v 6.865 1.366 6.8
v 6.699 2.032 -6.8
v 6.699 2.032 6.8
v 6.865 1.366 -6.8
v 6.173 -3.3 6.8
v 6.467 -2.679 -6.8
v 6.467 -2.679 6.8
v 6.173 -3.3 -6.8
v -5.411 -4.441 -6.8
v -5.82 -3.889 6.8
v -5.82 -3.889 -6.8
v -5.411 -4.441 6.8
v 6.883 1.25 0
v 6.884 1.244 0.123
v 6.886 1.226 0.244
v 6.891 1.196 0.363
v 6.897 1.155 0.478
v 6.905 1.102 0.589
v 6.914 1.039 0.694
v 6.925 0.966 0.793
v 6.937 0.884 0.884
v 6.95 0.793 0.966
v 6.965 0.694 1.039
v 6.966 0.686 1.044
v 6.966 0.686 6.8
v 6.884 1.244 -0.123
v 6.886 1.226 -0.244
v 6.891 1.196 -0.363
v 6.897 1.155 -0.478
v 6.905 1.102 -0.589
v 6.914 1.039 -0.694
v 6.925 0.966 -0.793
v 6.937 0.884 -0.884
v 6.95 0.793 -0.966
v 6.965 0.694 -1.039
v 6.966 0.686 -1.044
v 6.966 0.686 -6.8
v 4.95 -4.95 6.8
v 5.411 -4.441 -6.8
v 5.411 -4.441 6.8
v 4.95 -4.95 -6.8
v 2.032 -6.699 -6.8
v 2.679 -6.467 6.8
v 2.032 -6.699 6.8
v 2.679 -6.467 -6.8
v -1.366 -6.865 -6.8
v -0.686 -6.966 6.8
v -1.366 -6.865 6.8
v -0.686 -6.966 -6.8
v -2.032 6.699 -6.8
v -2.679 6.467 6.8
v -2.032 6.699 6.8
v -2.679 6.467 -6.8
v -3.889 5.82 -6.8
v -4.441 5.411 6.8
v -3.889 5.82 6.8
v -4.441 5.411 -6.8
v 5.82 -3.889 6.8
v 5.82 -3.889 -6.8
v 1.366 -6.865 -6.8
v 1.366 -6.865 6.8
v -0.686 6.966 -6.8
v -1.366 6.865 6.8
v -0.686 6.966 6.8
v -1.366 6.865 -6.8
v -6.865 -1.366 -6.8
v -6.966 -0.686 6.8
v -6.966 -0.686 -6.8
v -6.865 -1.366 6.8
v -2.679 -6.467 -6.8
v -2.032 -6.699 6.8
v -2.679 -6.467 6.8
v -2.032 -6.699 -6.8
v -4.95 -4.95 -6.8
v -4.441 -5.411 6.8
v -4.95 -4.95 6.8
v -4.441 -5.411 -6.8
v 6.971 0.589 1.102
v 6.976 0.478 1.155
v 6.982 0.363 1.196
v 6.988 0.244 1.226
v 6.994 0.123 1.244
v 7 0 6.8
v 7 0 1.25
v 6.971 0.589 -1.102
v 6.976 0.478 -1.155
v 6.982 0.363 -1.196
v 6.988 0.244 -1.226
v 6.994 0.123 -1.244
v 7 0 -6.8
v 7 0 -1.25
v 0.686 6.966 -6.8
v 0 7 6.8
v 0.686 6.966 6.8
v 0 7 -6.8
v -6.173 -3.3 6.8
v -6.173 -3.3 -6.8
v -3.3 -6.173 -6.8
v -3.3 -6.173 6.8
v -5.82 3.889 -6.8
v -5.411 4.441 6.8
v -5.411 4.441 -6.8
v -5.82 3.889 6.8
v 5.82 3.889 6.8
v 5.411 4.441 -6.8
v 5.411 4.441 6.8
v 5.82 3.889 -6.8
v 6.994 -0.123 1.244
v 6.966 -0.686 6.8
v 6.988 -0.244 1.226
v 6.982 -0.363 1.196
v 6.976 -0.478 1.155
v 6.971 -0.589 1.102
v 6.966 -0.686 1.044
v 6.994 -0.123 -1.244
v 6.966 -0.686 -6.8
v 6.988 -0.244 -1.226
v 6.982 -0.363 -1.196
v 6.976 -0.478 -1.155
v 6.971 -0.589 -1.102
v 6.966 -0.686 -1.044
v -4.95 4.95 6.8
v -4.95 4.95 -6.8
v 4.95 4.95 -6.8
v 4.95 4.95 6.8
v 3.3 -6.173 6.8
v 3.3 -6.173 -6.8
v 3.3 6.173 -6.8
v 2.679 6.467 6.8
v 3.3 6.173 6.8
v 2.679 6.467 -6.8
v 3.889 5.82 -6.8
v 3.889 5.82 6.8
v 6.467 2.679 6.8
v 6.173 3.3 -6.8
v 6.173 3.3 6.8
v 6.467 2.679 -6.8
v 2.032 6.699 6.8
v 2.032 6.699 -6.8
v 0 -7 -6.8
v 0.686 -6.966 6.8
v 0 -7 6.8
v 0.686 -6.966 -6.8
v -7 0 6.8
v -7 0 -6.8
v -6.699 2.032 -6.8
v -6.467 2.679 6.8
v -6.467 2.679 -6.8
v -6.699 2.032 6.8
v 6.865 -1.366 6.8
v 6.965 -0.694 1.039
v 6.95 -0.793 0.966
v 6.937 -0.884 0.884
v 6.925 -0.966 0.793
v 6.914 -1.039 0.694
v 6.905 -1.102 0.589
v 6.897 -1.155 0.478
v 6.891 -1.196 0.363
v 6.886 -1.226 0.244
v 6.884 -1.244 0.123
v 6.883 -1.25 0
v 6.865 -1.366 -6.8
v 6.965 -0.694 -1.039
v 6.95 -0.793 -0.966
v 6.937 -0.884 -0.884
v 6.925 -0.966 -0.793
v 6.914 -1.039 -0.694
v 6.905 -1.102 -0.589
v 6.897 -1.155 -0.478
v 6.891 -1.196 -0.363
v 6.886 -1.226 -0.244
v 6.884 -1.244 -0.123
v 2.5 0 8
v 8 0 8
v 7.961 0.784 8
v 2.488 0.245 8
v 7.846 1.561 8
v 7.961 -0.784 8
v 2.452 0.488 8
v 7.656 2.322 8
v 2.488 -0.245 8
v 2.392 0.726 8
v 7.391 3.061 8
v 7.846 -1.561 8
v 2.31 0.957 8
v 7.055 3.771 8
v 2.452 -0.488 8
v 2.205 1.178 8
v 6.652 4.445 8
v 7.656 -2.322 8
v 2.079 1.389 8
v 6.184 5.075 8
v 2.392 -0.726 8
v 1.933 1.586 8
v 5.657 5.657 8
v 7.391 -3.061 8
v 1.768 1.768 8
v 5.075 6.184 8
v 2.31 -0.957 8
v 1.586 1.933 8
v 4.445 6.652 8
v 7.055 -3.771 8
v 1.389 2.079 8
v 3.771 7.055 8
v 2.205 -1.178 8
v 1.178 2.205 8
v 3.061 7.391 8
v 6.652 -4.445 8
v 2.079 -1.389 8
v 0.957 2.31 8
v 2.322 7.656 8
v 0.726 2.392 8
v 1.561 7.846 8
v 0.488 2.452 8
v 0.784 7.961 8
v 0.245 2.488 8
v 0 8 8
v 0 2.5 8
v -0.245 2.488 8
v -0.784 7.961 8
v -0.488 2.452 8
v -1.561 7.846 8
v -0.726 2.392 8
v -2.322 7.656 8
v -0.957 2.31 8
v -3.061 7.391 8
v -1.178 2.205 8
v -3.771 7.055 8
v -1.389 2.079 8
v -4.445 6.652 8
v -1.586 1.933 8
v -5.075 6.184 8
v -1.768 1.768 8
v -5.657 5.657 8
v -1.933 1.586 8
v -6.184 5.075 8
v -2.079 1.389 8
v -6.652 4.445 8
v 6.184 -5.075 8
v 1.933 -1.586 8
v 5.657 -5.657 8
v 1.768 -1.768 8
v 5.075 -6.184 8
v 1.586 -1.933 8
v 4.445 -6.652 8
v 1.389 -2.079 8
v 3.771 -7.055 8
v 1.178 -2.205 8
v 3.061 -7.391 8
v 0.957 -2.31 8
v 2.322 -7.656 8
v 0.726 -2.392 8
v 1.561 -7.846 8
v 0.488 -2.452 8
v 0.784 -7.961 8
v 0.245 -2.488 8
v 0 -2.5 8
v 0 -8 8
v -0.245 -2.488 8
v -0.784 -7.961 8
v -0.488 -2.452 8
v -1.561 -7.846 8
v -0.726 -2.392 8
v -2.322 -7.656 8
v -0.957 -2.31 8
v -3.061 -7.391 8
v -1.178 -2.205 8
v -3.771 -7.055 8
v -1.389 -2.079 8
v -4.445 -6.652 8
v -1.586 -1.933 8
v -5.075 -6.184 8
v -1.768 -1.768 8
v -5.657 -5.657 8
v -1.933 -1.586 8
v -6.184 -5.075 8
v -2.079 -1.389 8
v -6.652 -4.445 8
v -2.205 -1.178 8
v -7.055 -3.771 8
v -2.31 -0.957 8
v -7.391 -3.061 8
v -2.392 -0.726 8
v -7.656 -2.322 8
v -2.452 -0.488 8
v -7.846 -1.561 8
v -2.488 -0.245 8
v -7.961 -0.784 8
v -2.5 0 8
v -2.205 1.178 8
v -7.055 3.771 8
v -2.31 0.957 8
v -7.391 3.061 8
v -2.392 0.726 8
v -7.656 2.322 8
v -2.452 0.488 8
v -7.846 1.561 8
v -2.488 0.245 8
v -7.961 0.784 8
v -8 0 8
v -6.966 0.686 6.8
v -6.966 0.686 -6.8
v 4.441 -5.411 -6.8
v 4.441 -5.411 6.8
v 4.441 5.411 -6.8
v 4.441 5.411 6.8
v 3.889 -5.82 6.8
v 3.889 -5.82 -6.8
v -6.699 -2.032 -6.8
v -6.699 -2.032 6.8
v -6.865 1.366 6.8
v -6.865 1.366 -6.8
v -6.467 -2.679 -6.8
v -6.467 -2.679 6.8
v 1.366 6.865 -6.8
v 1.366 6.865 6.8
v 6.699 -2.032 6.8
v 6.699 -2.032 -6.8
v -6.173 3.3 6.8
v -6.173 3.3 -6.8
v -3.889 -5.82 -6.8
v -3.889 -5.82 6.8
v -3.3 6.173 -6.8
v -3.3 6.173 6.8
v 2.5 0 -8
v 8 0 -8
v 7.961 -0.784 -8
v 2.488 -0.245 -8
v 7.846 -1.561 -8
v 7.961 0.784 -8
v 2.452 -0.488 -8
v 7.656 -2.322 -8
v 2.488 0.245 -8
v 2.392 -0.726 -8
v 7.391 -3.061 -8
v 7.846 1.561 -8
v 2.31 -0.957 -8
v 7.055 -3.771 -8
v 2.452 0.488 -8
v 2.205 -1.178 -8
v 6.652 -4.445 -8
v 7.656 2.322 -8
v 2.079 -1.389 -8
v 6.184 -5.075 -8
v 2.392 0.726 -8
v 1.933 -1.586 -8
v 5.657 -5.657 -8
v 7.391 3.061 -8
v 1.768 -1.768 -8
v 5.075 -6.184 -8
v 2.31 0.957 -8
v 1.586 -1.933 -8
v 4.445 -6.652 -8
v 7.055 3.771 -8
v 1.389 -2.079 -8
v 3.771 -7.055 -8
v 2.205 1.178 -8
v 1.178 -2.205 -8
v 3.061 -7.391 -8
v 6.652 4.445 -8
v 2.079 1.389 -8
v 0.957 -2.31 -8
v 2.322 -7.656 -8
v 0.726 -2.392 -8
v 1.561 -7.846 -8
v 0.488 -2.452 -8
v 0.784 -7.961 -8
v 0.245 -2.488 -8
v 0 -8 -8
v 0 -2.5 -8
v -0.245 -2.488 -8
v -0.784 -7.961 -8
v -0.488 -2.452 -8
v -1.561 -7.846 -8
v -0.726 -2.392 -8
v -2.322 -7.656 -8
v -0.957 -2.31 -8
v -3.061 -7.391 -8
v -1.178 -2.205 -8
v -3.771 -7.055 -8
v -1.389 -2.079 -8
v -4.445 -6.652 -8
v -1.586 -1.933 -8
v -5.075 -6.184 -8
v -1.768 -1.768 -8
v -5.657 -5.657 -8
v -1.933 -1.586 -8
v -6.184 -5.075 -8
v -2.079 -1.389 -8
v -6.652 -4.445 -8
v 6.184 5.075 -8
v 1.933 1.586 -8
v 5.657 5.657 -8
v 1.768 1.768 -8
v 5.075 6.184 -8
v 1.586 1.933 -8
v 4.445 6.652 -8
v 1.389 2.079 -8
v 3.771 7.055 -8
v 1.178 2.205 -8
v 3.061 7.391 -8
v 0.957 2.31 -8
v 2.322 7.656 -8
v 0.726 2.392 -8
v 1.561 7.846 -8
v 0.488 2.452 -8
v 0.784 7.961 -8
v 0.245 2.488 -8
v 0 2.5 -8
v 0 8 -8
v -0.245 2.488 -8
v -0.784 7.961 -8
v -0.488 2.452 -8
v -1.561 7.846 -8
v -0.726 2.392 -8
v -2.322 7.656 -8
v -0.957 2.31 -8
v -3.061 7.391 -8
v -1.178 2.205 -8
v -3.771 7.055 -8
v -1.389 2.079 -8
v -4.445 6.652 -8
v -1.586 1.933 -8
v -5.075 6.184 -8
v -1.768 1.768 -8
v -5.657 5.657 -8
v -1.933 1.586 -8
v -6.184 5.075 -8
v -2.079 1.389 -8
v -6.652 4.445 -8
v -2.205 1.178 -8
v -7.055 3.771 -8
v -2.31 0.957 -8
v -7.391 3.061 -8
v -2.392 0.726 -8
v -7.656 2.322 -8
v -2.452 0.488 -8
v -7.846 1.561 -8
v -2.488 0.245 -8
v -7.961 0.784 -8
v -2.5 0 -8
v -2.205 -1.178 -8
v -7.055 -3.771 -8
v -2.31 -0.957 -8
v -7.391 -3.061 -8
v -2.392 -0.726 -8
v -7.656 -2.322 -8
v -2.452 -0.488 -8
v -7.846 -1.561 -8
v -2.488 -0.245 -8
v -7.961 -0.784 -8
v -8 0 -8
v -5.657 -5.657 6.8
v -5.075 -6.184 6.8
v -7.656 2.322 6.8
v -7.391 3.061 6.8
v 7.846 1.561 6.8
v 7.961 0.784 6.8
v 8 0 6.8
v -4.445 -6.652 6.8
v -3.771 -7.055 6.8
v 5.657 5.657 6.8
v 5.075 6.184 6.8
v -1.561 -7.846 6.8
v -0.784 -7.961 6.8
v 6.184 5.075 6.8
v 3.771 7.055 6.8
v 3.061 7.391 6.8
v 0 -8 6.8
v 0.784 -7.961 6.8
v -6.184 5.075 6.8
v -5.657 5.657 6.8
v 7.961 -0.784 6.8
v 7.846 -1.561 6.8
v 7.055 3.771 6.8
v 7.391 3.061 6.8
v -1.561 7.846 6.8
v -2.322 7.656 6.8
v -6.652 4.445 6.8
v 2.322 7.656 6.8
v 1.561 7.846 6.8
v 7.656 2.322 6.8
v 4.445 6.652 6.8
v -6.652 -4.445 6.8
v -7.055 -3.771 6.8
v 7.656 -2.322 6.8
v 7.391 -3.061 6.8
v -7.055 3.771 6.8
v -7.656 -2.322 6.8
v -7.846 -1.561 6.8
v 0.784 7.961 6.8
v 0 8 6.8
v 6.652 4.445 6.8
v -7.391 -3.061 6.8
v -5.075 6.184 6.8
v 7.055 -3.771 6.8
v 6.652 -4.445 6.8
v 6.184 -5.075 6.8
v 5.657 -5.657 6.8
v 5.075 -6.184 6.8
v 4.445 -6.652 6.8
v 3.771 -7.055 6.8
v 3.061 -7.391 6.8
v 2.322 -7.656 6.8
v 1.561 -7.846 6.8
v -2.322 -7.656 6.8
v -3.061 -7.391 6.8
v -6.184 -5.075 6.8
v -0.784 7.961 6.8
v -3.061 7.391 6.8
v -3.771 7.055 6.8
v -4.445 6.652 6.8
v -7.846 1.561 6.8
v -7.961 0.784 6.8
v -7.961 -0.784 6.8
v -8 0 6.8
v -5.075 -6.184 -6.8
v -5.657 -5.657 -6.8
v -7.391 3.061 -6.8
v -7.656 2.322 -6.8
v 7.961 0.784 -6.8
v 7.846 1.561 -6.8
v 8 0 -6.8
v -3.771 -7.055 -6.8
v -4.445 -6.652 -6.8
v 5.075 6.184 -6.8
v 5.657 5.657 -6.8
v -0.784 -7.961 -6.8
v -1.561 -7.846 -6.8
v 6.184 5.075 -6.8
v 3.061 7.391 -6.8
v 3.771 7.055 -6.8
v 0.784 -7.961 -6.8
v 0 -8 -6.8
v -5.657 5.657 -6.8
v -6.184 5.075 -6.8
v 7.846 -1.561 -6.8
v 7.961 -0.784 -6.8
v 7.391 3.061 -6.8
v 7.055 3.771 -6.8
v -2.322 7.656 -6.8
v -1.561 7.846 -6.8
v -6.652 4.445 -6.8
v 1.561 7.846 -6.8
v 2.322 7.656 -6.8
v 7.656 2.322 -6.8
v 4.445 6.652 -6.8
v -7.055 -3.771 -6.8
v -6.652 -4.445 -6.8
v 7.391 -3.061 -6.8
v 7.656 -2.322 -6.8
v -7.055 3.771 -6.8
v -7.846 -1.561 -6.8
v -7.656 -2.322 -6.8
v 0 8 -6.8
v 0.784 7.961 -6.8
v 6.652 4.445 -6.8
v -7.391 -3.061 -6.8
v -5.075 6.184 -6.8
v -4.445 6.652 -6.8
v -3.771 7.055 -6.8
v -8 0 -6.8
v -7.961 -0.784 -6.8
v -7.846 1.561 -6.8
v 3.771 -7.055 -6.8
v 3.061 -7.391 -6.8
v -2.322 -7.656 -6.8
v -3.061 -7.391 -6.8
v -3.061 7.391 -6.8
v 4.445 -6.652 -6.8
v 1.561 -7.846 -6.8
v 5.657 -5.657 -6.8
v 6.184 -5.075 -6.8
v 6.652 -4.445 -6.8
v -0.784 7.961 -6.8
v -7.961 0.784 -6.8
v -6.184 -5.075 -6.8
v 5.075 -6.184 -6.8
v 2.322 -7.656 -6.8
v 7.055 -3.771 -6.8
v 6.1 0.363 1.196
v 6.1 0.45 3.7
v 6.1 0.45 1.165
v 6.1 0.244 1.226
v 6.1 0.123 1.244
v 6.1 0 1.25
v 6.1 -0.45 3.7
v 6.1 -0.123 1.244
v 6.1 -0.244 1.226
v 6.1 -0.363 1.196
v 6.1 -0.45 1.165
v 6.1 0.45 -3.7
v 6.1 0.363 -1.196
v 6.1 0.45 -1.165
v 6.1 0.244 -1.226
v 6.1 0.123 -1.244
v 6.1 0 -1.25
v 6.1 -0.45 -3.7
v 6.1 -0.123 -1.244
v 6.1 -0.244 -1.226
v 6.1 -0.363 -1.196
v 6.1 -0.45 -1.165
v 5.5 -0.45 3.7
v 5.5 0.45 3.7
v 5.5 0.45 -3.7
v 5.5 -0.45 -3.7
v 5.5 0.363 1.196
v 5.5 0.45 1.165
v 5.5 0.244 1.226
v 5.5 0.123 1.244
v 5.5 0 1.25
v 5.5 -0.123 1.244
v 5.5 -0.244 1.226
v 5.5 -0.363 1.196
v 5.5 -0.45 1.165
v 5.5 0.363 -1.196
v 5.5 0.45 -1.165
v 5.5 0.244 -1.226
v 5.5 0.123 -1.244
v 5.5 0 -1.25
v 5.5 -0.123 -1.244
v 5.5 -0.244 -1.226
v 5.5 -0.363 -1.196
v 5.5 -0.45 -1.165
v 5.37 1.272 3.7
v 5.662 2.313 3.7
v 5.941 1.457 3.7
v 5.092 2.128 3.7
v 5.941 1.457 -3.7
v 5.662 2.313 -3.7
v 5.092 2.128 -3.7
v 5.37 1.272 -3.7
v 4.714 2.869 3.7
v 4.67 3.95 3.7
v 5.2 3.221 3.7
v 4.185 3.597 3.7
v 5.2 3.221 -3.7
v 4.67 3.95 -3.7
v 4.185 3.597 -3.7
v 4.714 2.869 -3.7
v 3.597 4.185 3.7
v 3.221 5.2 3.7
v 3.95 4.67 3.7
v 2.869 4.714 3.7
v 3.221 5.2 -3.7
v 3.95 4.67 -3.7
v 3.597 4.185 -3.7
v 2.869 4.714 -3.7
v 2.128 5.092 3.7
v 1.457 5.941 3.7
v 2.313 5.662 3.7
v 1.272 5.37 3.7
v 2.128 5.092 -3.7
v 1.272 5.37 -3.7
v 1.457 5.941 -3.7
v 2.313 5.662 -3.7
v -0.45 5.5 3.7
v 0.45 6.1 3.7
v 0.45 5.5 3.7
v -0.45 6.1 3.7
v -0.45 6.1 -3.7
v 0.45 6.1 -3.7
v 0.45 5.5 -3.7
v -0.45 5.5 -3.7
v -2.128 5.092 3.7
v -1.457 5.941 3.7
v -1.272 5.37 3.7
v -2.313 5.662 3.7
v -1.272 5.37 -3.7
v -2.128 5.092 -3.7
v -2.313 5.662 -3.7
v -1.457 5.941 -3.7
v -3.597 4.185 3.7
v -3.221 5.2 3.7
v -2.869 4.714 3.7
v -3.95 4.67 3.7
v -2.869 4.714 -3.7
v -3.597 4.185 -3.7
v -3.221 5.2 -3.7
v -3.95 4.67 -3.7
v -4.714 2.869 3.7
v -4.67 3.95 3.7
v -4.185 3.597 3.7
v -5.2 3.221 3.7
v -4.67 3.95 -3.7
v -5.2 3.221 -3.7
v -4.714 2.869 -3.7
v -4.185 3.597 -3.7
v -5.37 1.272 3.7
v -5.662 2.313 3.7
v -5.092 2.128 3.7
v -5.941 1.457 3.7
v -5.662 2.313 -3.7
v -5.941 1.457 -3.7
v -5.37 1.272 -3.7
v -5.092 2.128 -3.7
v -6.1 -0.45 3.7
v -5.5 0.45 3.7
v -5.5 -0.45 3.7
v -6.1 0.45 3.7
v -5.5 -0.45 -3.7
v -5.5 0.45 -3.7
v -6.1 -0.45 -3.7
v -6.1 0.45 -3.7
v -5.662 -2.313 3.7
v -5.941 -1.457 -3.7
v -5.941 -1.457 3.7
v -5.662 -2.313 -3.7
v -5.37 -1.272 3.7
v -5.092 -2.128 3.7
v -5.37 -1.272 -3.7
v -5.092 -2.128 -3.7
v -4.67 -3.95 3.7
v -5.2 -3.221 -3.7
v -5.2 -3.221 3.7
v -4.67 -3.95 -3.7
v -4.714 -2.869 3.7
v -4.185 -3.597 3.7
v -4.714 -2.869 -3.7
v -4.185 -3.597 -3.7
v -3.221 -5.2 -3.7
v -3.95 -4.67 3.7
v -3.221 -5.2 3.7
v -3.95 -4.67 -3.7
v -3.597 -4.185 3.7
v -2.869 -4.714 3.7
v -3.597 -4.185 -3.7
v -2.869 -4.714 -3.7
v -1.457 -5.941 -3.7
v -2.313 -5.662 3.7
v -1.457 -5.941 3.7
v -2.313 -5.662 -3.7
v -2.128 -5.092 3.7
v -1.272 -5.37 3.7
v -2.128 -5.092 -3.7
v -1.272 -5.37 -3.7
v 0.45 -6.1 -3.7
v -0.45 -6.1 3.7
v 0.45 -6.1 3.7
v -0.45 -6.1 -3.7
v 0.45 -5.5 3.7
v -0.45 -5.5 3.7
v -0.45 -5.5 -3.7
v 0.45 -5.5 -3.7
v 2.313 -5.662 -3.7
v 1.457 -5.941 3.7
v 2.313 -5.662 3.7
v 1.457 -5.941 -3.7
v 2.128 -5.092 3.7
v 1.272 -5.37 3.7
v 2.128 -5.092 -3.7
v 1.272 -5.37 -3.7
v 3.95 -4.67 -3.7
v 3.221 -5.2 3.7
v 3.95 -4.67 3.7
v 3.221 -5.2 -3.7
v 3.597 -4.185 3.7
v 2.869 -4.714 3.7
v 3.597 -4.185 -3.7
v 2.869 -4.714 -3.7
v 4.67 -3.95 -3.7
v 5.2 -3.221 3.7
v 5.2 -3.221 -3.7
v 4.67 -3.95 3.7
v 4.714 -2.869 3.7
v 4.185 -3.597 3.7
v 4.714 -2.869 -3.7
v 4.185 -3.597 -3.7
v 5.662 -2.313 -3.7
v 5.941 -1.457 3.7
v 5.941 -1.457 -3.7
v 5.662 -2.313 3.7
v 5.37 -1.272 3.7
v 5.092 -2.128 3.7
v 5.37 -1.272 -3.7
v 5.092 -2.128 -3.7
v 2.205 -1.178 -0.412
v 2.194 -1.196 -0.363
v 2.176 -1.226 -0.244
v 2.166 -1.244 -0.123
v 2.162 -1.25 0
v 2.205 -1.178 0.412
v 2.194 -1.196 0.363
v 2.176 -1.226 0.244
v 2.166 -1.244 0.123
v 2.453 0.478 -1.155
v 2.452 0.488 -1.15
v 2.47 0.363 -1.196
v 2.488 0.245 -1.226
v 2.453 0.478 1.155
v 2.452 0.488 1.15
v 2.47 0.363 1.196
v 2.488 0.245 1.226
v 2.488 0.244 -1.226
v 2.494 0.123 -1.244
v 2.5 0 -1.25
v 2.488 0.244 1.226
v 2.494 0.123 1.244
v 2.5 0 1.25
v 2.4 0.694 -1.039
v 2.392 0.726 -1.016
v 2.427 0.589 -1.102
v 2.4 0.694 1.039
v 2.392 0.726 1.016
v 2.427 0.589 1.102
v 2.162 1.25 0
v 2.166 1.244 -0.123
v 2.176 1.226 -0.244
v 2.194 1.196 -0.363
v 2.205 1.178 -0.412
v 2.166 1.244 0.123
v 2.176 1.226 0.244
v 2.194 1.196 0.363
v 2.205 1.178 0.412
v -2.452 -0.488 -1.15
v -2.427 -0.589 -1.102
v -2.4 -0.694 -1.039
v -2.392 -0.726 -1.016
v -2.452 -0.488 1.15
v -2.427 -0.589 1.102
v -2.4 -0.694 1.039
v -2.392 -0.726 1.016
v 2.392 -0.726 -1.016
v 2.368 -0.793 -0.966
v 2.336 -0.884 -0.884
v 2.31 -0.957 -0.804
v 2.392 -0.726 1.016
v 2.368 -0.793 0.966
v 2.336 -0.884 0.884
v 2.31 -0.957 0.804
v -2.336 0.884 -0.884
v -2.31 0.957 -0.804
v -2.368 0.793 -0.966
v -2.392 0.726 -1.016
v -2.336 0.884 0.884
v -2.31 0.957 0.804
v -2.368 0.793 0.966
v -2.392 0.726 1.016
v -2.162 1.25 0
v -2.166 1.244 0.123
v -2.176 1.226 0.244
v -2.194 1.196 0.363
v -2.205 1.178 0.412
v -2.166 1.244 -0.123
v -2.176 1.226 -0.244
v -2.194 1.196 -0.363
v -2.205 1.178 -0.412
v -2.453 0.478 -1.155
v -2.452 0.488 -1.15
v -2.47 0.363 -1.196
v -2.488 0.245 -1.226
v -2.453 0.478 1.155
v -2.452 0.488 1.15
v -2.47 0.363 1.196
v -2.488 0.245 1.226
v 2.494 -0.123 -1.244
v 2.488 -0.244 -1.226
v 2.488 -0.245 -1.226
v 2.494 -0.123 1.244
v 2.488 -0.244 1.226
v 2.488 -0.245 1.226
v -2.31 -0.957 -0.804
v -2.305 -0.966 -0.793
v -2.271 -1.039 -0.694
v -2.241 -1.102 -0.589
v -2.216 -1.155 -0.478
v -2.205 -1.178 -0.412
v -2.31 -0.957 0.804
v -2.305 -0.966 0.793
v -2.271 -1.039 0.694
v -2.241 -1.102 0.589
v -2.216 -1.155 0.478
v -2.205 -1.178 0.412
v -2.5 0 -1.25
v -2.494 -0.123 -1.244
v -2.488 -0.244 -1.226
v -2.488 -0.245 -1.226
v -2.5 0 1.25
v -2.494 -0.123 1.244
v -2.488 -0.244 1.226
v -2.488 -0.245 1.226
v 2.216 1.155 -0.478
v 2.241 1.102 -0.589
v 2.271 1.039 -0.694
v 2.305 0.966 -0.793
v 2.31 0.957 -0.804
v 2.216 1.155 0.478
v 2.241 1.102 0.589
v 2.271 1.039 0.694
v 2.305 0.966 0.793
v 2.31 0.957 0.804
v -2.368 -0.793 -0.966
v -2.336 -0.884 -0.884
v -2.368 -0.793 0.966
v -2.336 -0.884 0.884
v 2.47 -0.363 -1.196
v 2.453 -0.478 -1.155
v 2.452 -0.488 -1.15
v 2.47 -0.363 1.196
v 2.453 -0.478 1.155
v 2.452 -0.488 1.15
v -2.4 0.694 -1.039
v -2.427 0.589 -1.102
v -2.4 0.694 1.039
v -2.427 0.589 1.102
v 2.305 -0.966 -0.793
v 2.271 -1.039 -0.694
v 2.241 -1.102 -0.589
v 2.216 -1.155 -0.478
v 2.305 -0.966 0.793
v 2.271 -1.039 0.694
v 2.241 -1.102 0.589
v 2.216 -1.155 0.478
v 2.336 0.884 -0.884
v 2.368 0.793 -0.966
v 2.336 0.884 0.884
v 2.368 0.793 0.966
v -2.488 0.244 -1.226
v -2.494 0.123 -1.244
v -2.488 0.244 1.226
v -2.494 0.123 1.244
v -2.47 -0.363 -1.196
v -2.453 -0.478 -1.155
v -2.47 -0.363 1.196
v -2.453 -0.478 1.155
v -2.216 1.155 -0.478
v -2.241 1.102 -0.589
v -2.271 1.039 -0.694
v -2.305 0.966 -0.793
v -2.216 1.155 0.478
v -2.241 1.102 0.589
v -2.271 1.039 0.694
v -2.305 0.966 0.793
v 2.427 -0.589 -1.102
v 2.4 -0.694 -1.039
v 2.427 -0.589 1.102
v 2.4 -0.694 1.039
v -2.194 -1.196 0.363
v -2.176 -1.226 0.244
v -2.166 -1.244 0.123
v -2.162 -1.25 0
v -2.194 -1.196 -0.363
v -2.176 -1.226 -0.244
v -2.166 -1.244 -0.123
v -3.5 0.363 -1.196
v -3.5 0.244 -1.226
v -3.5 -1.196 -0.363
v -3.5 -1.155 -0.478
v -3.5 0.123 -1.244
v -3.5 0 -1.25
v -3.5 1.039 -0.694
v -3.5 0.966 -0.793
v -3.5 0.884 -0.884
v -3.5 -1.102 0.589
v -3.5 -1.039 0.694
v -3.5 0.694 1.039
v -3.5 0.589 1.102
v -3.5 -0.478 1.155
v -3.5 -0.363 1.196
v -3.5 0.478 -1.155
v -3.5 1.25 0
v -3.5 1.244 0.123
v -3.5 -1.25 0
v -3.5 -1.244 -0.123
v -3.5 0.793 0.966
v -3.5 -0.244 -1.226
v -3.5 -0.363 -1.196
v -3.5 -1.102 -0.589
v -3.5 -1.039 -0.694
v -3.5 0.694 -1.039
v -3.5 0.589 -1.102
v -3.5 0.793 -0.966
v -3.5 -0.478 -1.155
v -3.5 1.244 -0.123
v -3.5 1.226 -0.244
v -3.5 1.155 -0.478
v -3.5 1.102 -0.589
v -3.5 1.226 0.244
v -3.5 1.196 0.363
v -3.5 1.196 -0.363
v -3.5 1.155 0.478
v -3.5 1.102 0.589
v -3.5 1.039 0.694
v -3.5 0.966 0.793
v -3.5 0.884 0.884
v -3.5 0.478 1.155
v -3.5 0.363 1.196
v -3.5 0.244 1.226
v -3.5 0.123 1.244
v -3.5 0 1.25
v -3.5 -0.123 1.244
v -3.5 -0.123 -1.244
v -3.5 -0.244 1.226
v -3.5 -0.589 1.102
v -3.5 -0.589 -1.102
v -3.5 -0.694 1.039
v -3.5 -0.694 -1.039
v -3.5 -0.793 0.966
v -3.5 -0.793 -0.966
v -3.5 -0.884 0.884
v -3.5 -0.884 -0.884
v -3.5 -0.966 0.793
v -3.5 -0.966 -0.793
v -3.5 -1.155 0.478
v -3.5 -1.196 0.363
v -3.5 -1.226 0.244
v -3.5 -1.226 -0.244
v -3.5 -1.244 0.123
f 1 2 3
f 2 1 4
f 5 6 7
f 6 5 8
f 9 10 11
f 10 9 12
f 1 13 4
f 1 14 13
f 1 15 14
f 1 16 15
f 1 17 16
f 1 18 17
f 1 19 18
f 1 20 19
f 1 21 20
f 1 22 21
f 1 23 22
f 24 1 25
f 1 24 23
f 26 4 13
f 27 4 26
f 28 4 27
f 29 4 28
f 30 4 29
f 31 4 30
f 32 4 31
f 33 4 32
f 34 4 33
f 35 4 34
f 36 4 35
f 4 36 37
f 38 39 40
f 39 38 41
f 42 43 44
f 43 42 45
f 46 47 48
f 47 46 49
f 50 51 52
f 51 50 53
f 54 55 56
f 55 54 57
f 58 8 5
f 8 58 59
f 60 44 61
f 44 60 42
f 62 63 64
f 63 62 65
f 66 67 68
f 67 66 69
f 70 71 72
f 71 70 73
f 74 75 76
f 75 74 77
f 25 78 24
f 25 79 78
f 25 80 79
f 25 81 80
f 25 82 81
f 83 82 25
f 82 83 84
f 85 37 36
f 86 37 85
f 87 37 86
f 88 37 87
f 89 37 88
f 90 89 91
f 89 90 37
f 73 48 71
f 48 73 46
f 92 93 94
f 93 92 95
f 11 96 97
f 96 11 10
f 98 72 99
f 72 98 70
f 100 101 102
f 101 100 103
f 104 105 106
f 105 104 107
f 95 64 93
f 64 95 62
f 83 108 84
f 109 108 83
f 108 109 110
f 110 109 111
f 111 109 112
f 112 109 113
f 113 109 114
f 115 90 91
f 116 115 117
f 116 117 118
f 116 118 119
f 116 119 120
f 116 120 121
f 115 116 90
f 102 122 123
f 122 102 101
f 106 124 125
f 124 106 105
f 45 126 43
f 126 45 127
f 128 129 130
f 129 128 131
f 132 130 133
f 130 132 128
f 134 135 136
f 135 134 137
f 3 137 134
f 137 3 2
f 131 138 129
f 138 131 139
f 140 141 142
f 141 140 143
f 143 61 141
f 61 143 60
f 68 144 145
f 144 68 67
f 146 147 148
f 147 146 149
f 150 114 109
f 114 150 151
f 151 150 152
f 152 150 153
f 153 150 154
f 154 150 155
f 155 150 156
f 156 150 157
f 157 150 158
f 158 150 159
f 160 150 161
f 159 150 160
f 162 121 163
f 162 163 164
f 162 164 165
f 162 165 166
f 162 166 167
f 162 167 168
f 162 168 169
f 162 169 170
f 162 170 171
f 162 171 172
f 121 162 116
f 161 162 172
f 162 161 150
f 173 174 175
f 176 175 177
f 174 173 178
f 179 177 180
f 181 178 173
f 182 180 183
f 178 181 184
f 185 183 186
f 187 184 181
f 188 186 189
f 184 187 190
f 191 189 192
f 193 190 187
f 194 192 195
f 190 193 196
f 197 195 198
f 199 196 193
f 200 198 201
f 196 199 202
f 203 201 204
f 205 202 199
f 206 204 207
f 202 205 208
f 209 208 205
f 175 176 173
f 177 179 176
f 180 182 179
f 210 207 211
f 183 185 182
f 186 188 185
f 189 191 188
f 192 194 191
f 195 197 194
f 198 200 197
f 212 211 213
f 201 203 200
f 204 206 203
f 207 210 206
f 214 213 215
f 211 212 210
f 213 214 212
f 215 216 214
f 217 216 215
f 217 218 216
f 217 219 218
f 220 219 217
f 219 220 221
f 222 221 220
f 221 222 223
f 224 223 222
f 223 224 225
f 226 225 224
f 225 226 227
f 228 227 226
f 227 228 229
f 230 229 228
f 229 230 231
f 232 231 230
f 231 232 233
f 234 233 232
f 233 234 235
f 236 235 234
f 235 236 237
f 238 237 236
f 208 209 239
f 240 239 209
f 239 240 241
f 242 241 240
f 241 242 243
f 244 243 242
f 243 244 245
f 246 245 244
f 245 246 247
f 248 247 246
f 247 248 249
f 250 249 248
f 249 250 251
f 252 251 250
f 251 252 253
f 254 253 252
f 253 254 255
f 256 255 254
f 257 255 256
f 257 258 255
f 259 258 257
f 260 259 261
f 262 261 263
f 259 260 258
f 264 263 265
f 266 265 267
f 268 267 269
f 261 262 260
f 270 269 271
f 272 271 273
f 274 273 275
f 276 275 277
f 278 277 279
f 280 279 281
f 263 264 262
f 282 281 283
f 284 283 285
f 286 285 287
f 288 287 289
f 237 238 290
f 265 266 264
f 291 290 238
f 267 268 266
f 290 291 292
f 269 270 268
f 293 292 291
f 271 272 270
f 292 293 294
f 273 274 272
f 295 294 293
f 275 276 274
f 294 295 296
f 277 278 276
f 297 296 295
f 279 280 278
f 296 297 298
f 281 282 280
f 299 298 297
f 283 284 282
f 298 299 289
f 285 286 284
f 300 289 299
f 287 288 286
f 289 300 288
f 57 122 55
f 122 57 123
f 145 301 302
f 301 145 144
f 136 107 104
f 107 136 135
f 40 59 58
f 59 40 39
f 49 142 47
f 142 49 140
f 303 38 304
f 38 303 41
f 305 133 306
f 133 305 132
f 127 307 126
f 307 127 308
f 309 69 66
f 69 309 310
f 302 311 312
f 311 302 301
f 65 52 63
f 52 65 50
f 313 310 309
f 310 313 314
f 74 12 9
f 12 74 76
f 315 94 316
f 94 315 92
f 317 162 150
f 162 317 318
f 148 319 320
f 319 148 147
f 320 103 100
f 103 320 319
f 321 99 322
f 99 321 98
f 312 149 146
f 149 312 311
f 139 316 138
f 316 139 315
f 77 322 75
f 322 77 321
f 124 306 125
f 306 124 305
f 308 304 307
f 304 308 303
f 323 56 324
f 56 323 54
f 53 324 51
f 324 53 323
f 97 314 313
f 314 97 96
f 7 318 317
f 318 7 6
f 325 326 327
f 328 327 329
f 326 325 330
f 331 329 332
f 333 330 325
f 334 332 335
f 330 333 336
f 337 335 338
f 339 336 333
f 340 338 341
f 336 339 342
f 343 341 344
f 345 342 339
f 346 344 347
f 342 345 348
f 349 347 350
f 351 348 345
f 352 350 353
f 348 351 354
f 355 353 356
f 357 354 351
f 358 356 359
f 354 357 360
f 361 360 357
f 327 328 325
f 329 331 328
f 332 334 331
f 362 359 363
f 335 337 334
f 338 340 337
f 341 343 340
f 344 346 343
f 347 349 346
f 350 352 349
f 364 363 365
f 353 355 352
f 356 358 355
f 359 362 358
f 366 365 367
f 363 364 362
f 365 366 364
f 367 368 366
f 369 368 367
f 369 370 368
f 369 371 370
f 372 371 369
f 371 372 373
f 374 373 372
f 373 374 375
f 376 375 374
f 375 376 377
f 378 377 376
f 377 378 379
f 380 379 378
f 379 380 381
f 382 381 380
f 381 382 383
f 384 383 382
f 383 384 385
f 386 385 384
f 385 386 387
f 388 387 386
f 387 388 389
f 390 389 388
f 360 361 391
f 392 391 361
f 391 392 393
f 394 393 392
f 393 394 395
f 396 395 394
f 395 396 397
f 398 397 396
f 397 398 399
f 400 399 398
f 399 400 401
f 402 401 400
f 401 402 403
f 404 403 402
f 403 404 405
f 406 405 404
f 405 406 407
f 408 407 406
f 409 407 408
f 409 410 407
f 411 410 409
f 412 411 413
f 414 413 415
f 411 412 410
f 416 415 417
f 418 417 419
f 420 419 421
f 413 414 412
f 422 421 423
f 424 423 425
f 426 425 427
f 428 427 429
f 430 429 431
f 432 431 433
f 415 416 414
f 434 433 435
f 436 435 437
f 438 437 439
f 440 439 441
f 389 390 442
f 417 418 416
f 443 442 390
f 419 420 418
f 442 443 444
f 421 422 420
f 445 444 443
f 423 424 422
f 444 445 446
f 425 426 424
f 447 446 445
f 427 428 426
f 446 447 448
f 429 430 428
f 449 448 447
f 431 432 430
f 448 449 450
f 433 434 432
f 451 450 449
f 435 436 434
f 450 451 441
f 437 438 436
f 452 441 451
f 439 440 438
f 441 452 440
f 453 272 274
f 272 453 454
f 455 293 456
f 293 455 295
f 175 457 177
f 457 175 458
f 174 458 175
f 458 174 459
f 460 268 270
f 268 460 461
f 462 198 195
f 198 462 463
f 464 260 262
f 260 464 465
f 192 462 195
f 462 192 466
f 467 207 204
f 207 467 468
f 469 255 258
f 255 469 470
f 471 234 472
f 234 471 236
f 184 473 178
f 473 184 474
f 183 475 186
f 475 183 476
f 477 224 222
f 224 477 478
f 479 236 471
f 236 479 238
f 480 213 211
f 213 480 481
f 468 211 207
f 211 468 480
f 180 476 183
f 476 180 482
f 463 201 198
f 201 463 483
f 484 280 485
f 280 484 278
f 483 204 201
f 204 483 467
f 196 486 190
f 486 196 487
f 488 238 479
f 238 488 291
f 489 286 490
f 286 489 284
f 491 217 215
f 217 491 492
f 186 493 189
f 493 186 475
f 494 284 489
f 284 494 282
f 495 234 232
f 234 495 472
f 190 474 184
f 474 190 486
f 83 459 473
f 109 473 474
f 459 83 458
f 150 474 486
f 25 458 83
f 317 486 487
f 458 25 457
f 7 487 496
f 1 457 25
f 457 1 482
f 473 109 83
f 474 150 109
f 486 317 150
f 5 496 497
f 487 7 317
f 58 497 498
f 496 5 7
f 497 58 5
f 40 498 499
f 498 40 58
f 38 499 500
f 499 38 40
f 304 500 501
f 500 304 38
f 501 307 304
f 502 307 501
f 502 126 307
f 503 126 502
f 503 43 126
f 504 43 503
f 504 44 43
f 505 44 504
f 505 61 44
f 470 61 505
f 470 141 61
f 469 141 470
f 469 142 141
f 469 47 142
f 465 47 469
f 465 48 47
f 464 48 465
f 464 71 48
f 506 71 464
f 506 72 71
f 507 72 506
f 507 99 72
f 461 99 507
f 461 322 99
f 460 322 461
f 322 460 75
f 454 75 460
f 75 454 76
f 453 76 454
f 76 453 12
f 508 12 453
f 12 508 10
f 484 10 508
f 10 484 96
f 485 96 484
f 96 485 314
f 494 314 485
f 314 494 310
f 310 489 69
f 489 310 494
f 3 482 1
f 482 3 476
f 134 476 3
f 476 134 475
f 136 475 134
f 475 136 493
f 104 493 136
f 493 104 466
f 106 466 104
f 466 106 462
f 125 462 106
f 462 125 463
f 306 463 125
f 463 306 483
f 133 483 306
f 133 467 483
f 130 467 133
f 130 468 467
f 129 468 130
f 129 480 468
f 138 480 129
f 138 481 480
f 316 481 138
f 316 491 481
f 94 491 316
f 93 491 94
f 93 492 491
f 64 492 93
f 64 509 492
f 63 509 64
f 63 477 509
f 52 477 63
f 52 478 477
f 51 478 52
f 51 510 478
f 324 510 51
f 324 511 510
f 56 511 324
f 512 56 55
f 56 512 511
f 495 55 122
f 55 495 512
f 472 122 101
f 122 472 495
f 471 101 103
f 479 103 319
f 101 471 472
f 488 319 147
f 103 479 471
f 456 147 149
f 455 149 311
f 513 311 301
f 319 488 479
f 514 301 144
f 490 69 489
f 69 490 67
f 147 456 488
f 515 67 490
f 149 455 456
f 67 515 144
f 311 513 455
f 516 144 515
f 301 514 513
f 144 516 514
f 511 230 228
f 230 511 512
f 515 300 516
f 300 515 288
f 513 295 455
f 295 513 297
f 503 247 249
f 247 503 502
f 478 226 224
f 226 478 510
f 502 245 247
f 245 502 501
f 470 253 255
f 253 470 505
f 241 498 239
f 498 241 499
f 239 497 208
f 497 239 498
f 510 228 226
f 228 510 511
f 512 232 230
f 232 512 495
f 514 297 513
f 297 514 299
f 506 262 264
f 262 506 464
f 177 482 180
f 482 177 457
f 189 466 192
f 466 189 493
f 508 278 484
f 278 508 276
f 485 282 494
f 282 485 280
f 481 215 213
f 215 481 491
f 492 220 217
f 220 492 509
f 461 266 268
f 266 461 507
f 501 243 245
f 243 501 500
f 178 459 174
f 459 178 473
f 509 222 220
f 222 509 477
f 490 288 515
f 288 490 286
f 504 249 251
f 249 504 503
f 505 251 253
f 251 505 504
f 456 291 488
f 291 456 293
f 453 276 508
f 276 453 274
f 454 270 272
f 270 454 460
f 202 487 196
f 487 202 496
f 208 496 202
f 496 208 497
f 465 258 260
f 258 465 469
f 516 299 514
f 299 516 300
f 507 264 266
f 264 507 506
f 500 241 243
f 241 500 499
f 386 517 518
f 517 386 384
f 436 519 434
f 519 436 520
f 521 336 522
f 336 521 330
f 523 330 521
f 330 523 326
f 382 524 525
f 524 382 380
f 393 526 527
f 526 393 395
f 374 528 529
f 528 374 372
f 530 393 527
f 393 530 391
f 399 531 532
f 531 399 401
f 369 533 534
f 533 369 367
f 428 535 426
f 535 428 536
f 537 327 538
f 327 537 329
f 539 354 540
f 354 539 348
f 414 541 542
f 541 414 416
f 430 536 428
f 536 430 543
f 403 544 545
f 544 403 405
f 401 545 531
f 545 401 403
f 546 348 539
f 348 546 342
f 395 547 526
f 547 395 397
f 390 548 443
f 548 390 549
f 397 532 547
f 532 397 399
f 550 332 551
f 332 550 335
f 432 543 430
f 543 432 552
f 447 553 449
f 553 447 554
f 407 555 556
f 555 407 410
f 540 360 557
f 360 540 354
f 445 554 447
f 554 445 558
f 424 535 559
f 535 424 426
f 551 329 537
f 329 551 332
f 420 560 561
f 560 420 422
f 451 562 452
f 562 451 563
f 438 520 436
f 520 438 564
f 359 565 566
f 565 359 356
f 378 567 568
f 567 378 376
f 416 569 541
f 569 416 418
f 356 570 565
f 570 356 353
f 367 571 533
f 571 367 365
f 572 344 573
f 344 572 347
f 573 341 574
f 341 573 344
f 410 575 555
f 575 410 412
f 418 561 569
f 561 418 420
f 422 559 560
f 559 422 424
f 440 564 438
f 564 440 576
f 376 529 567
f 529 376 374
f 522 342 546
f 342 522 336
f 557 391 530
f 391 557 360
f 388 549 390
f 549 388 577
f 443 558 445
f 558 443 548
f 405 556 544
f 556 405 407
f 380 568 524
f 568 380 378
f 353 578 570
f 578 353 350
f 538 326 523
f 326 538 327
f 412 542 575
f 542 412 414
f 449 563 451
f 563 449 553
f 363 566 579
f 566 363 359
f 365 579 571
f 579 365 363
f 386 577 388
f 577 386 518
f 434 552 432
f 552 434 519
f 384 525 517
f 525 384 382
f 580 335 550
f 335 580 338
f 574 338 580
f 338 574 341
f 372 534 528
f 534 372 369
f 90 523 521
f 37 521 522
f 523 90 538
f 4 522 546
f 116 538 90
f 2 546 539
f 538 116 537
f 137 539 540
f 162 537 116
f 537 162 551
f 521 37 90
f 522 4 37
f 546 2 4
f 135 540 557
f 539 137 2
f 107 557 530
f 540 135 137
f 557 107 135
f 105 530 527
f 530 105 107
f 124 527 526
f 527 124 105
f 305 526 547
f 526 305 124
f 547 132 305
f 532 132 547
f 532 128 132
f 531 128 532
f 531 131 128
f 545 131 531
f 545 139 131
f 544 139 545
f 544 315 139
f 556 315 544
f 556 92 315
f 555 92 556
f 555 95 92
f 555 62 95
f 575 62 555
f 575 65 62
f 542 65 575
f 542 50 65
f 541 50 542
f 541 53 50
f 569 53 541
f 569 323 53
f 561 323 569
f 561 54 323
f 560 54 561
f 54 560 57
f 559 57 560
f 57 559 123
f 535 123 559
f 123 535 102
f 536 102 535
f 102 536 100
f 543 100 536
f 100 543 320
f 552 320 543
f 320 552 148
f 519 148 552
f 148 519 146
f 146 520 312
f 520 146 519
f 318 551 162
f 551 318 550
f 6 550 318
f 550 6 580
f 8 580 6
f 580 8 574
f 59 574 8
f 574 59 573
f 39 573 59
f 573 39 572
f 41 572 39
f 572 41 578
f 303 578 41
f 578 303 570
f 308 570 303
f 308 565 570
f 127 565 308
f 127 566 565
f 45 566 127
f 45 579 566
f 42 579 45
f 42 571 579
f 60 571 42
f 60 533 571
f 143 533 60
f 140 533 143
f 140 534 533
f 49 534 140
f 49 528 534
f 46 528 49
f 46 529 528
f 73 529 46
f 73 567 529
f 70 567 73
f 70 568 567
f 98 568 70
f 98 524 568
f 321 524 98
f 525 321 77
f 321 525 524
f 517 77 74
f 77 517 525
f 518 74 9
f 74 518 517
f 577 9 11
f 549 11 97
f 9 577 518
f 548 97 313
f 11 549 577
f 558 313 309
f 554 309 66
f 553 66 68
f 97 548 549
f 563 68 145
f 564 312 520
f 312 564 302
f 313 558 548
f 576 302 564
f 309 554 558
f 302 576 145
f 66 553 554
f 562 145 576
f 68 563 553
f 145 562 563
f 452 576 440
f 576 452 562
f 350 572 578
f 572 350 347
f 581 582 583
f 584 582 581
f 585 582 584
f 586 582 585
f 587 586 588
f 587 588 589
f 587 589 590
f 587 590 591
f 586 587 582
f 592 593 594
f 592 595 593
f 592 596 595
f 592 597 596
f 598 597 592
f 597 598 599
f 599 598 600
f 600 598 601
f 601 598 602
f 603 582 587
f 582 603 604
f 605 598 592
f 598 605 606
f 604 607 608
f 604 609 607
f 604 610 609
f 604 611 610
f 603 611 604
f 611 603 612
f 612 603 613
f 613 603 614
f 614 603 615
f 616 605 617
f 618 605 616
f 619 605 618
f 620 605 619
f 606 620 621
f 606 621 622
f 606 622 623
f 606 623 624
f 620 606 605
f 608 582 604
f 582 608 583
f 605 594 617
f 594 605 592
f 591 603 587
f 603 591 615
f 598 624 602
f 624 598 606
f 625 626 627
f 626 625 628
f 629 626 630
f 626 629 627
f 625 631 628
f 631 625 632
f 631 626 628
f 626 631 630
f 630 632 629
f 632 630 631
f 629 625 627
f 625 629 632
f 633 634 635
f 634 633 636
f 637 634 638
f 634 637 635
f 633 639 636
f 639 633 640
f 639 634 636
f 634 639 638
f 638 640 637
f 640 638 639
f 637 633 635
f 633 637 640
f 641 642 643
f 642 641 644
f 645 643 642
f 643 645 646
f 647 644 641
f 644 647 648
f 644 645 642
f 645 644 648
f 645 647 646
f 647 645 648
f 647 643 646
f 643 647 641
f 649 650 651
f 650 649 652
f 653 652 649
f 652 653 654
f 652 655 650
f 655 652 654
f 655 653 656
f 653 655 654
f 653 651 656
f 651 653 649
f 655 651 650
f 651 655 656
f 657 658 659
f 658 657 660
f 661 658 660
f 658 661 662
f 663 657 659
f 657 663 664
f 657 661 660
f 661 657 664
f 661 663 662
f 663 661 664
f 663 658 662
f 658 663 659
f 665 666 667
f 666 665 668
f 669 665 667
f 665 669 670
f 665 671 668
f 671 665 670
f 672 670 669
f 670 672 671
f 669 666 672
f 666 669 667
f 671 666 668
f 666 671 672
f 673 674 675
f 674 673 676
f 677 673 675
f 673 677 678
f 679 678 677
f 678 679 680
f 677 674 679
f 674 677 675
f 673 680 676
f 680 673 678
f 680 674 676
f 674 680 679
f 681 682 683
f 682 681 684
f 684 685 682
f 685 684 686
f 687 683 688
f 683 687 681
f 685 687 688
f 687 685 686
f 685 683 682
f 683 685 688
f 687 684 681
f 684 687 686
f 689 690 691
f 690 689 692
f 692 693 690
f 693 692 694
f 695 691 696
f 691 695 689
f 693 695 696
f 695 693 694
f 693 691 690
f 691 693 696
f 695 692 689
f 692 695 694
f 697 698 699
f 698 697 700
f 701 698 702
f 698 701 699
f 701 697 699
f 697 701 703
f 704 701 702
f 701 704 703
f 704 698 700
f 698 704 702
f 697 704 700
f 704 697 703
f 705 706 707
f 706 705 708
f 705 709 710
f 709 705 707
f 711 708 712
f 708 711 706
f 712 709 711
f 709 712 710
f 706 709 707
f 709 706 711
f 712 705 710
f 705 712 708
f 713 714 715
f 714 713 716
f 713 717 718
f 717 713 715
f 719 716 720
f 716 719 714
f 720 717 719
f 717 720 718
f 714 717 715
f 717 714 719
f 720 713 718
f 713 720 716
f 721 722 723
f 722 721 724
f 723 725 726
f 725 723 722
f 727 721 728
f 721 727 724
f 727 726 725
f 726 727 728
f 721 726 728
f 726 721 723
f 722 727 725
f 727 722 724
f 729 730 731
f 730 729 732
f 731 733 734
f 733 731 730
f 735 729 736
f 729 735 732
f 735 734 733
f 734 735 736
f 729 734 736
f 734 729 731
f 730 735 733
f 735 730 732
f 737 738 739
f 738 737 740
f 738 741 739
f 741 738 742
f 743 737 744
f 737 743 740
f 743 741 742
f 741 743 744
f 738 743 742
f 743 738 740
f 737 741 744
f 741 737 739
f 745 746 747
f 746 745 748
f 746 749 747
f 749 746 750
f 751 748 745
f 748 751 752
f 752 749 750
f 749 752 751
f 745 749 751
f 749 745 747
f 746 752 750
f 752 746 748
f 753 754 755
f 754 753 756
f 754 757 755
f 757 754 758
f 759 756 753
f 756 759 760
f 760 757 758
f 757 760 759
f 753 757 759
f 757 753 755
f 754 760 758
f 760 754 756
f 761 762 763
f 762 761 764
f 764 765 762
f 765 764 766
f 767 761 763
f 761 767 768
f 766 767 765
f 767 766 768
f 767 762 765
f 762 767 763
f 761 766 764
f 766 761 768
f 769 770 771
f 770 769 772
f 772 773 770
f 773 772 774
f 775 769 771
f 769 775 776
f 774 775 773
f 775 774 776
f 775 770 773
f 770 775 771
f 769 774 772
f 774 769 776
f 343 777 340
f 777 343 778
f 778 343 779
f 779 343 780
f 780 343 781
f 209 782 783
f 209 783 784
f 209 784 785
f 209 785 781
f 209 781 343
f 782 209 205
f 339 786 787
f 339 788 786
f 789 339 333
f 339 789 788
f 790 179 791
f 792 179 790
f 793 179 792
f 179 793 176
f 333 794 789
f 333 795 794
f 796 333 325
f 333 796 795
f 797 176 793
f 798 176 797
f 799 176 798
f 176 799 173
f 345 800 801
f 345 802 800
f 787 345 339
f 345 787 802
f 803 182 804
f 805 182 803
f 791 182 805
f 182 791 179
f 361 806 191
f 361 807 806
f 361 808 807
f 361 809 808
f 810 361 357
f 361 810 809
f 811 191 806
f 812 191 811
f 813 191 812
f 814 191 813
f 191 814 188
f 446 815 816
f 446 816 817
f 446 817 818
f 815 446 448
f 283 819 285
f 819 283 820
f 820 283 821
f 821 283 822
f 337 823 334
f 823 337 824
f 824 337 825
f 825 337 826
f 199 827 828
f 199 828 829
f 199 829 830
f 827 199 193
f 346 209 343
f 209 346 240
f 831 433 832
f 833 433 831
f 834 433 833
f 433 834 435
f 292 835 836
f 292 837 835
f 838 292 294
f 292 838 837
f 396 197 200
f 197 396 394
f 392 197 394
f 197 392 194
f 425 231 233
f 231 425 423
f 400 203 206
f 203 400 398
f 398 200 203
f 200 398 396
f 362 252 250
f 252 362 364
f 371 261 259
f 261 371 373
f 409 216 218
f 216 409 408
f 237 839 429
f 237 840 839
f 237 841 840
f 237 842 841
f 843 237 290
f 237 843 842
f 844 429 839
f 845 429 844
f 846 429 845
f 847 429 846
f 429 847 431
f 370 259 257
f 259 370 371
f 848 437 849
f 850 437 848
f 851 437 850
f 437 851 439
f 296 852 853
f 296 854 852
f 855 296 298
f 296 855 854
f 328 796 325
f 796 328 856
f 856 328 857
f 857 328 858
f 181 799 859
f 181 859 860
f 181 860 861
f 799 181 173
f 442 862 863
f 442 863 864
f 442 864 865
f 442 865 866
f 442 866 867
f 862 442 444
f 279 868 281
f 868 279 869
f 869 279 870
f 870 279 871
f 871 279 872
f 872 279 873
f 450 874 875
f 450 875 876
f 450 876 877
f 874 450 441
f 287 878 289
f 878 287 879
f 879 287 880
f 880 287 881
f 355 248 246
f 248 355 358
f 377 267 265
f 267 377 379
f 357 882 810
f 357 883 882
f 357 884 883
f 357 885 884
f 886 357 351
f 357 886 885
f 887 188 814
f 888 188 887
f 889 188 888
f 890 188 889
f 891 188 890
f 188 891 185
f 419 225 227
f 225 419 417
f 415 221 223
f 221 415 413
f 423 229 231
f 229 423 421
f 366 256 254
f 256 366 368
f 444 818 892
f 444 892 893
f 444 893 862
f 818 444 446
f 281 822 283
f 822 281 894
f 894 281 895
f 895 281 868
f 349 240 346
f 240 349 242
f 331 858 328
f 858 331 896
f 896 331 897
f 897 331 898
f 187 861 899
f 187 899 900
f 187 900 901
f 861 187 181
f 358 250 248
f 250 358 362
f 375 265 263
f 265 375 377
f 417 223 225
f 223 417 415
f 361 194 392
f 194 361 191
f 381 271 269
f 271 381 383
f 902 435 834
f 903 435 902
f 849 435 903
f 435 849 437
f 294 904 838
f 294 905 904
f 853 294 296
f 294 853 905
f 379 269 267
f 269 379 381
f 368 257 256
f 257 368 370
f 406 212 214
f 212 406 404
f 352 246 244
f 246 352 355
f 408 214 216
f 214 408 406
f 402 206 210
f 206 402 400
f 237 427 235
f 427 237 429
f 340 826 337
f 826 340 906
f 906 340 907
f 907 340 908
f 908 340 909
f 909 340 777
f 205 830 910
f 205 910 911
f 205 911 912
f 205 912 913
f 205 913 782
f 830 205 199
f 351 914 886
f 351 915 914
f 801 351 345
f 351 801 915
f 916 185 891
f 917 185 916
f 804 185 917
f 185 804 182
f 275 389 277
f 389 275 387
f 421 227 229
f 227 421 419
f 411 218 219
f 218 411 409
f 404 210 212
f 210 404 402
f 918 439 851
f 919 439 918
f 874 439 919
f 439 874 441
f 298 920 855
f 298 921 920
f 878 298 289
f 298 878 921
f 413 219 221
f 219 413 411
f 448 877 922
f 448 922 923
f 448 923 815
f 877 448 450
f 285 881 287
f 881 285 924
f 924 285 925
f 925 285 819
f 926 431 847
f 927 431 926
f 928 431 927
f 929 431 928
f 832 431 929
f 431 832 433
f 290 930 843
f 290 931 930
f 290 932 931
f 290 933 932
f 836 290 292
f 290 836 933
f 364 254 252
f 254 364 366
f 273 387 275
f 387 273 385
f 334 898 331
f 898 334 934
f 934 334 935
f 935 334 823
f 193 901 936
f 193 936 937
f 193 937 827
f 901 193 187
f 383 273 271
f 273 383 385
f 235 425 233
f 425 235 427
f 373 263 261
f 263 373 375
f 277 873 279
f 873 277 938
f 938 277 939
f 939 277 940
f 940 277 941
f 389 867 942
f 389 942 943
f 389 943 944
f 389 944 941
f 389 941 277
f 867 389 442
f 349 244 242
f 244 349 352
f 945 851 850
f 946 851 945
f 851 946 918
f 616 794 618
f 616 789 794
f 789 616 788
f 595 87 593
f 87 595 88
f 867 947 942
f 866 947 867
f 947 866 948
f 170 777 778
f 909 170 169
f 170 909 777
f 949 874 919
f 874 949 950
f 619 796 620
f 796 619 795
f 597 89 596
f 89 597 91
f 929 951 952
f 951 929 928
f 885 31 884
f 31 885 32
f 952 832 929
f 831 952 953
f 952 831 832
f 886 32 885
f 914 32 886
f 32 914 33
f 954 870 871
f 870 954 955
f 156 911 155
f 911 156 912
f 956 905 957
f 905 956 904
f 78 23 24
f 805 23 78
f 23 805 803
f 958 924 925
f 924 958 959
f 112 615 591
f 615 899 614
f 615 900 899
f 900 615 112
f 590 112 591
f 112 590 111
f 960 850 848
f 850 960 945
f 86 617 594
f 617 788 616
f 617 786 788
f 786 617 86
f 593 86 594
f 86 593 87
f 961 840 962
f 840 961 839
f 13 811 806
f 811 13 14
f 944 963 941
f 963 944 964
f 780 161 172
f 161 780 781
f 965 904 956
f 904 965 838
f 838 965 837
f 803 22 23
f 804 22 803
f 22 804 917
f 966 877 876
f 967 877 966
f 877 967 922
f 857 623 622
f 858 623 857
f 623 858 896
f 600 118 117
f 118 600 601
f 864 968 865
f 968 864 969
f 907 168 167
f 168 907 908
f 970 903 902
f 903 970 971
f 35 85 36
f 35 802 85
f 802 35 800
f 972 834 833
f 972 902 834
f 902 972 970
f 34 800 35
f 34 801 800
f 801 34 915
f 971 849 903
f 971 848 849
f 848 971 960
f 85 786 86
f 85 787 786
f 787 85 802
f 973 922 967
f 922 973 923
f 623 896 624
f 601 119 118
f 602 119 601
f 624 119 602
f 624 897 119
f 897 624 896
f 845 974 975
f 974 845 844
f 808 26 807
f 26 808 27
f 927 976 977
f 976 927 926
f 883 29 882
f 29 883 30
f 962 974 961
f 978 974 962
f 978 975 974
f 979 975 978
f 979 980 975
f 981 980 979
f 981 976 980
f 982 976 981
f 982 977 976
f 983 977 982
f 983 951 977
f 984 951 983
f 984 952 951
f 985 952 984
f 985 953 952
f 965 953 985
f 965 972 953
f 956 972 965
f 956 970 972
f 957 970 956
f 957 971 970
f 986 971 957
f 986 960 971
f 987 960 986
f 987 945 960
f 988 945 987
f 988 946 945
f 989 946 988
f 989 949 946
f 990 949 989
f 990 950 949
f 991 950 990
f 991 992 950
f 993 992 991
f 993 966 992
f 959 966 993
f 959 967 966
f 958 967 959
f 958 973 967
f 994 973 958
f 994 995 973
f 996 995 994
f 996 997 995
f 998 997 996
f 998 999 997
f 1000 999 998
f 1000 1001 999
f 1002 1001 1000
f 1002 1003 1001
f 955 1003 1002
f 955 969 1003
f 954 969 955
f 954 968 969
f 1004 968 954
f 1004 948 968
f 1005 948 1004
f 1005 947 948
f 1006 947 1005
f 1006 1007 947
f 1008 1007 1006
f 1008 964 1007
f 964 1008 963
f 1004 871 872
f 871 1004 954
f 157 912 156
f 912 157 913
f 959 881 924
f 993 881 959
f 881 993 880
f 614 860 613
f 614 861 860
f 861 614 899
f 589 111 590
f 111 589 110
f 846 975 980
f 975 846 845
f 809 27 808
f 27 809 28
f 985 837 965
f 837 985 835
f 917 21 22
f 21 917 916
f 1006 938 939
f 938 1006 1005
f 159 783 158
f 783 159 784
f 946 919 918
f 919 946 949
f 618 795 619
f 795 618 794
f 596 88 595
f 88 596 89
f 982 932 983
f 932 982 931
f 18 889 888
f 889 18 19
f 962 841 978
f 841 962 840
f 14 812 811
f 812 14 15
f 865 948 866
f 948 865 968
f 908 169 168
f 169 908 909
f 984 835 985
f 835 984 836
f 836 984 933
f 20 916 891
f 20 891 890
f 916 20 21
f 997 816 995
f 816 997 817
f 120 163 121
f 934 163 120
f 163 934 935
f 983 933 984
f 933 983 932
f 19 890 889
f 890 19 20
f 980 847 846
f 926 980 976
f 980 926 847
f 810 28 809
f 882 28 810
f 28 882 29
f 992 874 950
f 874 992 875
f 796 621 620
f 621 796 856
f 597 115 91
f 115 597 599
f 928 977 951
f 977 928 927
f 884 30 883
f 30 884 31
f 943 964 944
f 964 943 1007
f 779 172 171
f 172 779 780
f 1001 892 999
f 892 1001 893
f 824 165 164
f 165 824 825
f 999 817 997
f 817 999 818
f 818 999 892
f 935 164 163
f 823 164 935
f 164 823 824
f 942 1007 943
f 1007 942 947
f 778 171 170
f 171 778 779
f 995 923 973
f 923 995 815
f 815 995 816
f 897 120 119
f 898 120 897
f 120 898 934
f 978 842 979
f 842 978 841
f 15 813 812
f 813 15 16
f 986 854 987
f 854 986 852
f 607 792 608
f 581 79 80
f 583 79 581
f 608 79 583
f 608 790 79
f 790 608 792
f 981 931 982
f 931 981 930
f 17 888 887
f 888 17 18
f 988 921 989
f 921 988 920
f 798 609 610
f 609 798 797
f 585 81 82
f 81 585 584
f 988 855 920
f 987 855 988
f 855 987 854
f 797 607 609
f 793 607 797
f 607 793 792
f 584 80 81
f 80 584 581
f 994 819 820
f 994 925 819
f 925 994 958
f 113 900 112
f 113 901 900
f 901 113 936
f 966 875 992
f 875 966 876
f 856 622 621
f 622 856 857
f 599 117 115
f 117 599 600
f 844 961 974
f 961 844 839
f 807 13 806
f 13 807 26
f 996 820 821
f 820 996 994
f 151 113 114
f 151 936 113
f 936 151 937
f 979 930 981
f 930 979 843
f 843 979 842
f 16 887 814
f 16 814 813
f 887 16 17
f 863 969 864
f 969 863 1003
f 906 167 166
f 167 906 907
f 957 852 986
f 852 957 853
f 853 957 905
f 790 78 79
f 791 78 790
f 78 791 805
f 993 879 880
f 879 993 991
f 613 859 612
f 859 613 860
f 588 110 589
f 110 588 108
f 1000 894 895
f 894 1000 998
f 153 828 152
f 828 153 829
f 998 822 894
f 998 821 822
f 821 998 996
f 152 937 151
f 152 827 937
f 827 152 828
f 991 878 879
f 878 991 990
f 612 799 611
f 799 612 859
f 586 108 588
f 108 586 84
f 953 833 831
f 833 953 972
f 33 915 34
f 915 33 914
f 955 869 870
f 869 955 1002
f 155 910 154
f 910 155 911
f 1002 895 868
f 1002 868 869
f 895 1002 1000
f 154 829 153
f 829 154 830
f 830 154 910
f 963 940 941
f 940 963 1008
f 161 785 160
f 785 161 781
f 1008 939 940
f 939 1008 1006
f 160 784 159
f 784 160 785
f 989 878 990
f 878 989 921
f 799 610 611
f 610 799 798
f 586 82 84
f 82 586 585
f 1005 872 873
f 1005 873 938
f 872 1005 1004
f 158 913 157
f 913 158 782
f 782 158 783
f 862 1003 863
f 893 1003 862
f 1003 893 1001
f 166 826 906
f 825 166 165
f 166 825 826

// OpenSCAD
$fn=64;

// Approximate GT2 20T pulley (2mm pitch) with 5mm bore
// Dimensions are typical/approximate for printable model.

teeth = 20;
pitch = 2.0;
bore_d = 5.0;

pulley_od = 12.2;          // typical OD for 20T GT2 pulley
tooth_ring_od = 13.0;      // slight outer ring for tooth approximation
tooth_ring_id = 11.2;      // inner ring for tooth approximation

body_h = 16.0;             // overall height
tooth_h = 7.0;             // toothed section height
flange_h = 1.2;            // flange thickness
flange_od = 16.0;          // flange diameter

hub_od = 14.0;             // hub diameter
hub_h = body_h;            // full height hub

set_screw_d = 2.5;         // optional set screw hole
set_screw_z = 0;           // centered
set_screw_r = hub_od/2 - 1.5;

module gt2_pulley_20t_5mm() {
    difference() {
        union() {
            // Hub/body
            cylinder(d=hub_od, h=hub_h, center=true);

            // Tooth ring (approximation)
            translate([0,0,0])
                difference() {
                    cylinder(d=tooth_ring_od, h=tooth_h, center=true);
                    cylinder(d=tooth_ring_id, h=tooth_h+0.2, center=true);
                }

            // Flanges
            translate([0,0, body_h/2 - flange_h/2])
                cylinder(d=flange_od, h=flange_h, center=true);
            translate([0,0,-body_h/2 + flange_h/2])
                cylinder(d=flange_od, h=flange_h, center=true);

            // Slight outer cylinder to reach pulley OD in toothed area
            translate([0,0,0])
                cylinder(d=pulley_od, h=tooth_h, center=true);
        }

        // Bore
        cylinder(d=bore_d, h=body_h+2, center=true);

        // Set screw hole (radial)
        translate([0,0,set_screw_z])
            rotate([0,90,0])
                translate([0,0,set_screw_r])
                    cylinder(d=set_screw_d, h=hub_od+4, center=true);

        // Tooth notches (simple rectangular approximation around circumference)
        for (i = [0:teeth-1]) {
            angle = i * 360 / teeth;
            // notch dimensions
            notch_w = 0.9;     // tangential width
            notch_d = 0.6;     // radial depth
            notch_h = tooth_h + 0.4;

            rotate([0,0,angle])
                translate([pulley_od/2 - notch_d/2, 0, 0])
                    cube([notch_d, notch_w, notch_h], center=true);
        }
    }
}

gt2_pulley_20t_5mm();
